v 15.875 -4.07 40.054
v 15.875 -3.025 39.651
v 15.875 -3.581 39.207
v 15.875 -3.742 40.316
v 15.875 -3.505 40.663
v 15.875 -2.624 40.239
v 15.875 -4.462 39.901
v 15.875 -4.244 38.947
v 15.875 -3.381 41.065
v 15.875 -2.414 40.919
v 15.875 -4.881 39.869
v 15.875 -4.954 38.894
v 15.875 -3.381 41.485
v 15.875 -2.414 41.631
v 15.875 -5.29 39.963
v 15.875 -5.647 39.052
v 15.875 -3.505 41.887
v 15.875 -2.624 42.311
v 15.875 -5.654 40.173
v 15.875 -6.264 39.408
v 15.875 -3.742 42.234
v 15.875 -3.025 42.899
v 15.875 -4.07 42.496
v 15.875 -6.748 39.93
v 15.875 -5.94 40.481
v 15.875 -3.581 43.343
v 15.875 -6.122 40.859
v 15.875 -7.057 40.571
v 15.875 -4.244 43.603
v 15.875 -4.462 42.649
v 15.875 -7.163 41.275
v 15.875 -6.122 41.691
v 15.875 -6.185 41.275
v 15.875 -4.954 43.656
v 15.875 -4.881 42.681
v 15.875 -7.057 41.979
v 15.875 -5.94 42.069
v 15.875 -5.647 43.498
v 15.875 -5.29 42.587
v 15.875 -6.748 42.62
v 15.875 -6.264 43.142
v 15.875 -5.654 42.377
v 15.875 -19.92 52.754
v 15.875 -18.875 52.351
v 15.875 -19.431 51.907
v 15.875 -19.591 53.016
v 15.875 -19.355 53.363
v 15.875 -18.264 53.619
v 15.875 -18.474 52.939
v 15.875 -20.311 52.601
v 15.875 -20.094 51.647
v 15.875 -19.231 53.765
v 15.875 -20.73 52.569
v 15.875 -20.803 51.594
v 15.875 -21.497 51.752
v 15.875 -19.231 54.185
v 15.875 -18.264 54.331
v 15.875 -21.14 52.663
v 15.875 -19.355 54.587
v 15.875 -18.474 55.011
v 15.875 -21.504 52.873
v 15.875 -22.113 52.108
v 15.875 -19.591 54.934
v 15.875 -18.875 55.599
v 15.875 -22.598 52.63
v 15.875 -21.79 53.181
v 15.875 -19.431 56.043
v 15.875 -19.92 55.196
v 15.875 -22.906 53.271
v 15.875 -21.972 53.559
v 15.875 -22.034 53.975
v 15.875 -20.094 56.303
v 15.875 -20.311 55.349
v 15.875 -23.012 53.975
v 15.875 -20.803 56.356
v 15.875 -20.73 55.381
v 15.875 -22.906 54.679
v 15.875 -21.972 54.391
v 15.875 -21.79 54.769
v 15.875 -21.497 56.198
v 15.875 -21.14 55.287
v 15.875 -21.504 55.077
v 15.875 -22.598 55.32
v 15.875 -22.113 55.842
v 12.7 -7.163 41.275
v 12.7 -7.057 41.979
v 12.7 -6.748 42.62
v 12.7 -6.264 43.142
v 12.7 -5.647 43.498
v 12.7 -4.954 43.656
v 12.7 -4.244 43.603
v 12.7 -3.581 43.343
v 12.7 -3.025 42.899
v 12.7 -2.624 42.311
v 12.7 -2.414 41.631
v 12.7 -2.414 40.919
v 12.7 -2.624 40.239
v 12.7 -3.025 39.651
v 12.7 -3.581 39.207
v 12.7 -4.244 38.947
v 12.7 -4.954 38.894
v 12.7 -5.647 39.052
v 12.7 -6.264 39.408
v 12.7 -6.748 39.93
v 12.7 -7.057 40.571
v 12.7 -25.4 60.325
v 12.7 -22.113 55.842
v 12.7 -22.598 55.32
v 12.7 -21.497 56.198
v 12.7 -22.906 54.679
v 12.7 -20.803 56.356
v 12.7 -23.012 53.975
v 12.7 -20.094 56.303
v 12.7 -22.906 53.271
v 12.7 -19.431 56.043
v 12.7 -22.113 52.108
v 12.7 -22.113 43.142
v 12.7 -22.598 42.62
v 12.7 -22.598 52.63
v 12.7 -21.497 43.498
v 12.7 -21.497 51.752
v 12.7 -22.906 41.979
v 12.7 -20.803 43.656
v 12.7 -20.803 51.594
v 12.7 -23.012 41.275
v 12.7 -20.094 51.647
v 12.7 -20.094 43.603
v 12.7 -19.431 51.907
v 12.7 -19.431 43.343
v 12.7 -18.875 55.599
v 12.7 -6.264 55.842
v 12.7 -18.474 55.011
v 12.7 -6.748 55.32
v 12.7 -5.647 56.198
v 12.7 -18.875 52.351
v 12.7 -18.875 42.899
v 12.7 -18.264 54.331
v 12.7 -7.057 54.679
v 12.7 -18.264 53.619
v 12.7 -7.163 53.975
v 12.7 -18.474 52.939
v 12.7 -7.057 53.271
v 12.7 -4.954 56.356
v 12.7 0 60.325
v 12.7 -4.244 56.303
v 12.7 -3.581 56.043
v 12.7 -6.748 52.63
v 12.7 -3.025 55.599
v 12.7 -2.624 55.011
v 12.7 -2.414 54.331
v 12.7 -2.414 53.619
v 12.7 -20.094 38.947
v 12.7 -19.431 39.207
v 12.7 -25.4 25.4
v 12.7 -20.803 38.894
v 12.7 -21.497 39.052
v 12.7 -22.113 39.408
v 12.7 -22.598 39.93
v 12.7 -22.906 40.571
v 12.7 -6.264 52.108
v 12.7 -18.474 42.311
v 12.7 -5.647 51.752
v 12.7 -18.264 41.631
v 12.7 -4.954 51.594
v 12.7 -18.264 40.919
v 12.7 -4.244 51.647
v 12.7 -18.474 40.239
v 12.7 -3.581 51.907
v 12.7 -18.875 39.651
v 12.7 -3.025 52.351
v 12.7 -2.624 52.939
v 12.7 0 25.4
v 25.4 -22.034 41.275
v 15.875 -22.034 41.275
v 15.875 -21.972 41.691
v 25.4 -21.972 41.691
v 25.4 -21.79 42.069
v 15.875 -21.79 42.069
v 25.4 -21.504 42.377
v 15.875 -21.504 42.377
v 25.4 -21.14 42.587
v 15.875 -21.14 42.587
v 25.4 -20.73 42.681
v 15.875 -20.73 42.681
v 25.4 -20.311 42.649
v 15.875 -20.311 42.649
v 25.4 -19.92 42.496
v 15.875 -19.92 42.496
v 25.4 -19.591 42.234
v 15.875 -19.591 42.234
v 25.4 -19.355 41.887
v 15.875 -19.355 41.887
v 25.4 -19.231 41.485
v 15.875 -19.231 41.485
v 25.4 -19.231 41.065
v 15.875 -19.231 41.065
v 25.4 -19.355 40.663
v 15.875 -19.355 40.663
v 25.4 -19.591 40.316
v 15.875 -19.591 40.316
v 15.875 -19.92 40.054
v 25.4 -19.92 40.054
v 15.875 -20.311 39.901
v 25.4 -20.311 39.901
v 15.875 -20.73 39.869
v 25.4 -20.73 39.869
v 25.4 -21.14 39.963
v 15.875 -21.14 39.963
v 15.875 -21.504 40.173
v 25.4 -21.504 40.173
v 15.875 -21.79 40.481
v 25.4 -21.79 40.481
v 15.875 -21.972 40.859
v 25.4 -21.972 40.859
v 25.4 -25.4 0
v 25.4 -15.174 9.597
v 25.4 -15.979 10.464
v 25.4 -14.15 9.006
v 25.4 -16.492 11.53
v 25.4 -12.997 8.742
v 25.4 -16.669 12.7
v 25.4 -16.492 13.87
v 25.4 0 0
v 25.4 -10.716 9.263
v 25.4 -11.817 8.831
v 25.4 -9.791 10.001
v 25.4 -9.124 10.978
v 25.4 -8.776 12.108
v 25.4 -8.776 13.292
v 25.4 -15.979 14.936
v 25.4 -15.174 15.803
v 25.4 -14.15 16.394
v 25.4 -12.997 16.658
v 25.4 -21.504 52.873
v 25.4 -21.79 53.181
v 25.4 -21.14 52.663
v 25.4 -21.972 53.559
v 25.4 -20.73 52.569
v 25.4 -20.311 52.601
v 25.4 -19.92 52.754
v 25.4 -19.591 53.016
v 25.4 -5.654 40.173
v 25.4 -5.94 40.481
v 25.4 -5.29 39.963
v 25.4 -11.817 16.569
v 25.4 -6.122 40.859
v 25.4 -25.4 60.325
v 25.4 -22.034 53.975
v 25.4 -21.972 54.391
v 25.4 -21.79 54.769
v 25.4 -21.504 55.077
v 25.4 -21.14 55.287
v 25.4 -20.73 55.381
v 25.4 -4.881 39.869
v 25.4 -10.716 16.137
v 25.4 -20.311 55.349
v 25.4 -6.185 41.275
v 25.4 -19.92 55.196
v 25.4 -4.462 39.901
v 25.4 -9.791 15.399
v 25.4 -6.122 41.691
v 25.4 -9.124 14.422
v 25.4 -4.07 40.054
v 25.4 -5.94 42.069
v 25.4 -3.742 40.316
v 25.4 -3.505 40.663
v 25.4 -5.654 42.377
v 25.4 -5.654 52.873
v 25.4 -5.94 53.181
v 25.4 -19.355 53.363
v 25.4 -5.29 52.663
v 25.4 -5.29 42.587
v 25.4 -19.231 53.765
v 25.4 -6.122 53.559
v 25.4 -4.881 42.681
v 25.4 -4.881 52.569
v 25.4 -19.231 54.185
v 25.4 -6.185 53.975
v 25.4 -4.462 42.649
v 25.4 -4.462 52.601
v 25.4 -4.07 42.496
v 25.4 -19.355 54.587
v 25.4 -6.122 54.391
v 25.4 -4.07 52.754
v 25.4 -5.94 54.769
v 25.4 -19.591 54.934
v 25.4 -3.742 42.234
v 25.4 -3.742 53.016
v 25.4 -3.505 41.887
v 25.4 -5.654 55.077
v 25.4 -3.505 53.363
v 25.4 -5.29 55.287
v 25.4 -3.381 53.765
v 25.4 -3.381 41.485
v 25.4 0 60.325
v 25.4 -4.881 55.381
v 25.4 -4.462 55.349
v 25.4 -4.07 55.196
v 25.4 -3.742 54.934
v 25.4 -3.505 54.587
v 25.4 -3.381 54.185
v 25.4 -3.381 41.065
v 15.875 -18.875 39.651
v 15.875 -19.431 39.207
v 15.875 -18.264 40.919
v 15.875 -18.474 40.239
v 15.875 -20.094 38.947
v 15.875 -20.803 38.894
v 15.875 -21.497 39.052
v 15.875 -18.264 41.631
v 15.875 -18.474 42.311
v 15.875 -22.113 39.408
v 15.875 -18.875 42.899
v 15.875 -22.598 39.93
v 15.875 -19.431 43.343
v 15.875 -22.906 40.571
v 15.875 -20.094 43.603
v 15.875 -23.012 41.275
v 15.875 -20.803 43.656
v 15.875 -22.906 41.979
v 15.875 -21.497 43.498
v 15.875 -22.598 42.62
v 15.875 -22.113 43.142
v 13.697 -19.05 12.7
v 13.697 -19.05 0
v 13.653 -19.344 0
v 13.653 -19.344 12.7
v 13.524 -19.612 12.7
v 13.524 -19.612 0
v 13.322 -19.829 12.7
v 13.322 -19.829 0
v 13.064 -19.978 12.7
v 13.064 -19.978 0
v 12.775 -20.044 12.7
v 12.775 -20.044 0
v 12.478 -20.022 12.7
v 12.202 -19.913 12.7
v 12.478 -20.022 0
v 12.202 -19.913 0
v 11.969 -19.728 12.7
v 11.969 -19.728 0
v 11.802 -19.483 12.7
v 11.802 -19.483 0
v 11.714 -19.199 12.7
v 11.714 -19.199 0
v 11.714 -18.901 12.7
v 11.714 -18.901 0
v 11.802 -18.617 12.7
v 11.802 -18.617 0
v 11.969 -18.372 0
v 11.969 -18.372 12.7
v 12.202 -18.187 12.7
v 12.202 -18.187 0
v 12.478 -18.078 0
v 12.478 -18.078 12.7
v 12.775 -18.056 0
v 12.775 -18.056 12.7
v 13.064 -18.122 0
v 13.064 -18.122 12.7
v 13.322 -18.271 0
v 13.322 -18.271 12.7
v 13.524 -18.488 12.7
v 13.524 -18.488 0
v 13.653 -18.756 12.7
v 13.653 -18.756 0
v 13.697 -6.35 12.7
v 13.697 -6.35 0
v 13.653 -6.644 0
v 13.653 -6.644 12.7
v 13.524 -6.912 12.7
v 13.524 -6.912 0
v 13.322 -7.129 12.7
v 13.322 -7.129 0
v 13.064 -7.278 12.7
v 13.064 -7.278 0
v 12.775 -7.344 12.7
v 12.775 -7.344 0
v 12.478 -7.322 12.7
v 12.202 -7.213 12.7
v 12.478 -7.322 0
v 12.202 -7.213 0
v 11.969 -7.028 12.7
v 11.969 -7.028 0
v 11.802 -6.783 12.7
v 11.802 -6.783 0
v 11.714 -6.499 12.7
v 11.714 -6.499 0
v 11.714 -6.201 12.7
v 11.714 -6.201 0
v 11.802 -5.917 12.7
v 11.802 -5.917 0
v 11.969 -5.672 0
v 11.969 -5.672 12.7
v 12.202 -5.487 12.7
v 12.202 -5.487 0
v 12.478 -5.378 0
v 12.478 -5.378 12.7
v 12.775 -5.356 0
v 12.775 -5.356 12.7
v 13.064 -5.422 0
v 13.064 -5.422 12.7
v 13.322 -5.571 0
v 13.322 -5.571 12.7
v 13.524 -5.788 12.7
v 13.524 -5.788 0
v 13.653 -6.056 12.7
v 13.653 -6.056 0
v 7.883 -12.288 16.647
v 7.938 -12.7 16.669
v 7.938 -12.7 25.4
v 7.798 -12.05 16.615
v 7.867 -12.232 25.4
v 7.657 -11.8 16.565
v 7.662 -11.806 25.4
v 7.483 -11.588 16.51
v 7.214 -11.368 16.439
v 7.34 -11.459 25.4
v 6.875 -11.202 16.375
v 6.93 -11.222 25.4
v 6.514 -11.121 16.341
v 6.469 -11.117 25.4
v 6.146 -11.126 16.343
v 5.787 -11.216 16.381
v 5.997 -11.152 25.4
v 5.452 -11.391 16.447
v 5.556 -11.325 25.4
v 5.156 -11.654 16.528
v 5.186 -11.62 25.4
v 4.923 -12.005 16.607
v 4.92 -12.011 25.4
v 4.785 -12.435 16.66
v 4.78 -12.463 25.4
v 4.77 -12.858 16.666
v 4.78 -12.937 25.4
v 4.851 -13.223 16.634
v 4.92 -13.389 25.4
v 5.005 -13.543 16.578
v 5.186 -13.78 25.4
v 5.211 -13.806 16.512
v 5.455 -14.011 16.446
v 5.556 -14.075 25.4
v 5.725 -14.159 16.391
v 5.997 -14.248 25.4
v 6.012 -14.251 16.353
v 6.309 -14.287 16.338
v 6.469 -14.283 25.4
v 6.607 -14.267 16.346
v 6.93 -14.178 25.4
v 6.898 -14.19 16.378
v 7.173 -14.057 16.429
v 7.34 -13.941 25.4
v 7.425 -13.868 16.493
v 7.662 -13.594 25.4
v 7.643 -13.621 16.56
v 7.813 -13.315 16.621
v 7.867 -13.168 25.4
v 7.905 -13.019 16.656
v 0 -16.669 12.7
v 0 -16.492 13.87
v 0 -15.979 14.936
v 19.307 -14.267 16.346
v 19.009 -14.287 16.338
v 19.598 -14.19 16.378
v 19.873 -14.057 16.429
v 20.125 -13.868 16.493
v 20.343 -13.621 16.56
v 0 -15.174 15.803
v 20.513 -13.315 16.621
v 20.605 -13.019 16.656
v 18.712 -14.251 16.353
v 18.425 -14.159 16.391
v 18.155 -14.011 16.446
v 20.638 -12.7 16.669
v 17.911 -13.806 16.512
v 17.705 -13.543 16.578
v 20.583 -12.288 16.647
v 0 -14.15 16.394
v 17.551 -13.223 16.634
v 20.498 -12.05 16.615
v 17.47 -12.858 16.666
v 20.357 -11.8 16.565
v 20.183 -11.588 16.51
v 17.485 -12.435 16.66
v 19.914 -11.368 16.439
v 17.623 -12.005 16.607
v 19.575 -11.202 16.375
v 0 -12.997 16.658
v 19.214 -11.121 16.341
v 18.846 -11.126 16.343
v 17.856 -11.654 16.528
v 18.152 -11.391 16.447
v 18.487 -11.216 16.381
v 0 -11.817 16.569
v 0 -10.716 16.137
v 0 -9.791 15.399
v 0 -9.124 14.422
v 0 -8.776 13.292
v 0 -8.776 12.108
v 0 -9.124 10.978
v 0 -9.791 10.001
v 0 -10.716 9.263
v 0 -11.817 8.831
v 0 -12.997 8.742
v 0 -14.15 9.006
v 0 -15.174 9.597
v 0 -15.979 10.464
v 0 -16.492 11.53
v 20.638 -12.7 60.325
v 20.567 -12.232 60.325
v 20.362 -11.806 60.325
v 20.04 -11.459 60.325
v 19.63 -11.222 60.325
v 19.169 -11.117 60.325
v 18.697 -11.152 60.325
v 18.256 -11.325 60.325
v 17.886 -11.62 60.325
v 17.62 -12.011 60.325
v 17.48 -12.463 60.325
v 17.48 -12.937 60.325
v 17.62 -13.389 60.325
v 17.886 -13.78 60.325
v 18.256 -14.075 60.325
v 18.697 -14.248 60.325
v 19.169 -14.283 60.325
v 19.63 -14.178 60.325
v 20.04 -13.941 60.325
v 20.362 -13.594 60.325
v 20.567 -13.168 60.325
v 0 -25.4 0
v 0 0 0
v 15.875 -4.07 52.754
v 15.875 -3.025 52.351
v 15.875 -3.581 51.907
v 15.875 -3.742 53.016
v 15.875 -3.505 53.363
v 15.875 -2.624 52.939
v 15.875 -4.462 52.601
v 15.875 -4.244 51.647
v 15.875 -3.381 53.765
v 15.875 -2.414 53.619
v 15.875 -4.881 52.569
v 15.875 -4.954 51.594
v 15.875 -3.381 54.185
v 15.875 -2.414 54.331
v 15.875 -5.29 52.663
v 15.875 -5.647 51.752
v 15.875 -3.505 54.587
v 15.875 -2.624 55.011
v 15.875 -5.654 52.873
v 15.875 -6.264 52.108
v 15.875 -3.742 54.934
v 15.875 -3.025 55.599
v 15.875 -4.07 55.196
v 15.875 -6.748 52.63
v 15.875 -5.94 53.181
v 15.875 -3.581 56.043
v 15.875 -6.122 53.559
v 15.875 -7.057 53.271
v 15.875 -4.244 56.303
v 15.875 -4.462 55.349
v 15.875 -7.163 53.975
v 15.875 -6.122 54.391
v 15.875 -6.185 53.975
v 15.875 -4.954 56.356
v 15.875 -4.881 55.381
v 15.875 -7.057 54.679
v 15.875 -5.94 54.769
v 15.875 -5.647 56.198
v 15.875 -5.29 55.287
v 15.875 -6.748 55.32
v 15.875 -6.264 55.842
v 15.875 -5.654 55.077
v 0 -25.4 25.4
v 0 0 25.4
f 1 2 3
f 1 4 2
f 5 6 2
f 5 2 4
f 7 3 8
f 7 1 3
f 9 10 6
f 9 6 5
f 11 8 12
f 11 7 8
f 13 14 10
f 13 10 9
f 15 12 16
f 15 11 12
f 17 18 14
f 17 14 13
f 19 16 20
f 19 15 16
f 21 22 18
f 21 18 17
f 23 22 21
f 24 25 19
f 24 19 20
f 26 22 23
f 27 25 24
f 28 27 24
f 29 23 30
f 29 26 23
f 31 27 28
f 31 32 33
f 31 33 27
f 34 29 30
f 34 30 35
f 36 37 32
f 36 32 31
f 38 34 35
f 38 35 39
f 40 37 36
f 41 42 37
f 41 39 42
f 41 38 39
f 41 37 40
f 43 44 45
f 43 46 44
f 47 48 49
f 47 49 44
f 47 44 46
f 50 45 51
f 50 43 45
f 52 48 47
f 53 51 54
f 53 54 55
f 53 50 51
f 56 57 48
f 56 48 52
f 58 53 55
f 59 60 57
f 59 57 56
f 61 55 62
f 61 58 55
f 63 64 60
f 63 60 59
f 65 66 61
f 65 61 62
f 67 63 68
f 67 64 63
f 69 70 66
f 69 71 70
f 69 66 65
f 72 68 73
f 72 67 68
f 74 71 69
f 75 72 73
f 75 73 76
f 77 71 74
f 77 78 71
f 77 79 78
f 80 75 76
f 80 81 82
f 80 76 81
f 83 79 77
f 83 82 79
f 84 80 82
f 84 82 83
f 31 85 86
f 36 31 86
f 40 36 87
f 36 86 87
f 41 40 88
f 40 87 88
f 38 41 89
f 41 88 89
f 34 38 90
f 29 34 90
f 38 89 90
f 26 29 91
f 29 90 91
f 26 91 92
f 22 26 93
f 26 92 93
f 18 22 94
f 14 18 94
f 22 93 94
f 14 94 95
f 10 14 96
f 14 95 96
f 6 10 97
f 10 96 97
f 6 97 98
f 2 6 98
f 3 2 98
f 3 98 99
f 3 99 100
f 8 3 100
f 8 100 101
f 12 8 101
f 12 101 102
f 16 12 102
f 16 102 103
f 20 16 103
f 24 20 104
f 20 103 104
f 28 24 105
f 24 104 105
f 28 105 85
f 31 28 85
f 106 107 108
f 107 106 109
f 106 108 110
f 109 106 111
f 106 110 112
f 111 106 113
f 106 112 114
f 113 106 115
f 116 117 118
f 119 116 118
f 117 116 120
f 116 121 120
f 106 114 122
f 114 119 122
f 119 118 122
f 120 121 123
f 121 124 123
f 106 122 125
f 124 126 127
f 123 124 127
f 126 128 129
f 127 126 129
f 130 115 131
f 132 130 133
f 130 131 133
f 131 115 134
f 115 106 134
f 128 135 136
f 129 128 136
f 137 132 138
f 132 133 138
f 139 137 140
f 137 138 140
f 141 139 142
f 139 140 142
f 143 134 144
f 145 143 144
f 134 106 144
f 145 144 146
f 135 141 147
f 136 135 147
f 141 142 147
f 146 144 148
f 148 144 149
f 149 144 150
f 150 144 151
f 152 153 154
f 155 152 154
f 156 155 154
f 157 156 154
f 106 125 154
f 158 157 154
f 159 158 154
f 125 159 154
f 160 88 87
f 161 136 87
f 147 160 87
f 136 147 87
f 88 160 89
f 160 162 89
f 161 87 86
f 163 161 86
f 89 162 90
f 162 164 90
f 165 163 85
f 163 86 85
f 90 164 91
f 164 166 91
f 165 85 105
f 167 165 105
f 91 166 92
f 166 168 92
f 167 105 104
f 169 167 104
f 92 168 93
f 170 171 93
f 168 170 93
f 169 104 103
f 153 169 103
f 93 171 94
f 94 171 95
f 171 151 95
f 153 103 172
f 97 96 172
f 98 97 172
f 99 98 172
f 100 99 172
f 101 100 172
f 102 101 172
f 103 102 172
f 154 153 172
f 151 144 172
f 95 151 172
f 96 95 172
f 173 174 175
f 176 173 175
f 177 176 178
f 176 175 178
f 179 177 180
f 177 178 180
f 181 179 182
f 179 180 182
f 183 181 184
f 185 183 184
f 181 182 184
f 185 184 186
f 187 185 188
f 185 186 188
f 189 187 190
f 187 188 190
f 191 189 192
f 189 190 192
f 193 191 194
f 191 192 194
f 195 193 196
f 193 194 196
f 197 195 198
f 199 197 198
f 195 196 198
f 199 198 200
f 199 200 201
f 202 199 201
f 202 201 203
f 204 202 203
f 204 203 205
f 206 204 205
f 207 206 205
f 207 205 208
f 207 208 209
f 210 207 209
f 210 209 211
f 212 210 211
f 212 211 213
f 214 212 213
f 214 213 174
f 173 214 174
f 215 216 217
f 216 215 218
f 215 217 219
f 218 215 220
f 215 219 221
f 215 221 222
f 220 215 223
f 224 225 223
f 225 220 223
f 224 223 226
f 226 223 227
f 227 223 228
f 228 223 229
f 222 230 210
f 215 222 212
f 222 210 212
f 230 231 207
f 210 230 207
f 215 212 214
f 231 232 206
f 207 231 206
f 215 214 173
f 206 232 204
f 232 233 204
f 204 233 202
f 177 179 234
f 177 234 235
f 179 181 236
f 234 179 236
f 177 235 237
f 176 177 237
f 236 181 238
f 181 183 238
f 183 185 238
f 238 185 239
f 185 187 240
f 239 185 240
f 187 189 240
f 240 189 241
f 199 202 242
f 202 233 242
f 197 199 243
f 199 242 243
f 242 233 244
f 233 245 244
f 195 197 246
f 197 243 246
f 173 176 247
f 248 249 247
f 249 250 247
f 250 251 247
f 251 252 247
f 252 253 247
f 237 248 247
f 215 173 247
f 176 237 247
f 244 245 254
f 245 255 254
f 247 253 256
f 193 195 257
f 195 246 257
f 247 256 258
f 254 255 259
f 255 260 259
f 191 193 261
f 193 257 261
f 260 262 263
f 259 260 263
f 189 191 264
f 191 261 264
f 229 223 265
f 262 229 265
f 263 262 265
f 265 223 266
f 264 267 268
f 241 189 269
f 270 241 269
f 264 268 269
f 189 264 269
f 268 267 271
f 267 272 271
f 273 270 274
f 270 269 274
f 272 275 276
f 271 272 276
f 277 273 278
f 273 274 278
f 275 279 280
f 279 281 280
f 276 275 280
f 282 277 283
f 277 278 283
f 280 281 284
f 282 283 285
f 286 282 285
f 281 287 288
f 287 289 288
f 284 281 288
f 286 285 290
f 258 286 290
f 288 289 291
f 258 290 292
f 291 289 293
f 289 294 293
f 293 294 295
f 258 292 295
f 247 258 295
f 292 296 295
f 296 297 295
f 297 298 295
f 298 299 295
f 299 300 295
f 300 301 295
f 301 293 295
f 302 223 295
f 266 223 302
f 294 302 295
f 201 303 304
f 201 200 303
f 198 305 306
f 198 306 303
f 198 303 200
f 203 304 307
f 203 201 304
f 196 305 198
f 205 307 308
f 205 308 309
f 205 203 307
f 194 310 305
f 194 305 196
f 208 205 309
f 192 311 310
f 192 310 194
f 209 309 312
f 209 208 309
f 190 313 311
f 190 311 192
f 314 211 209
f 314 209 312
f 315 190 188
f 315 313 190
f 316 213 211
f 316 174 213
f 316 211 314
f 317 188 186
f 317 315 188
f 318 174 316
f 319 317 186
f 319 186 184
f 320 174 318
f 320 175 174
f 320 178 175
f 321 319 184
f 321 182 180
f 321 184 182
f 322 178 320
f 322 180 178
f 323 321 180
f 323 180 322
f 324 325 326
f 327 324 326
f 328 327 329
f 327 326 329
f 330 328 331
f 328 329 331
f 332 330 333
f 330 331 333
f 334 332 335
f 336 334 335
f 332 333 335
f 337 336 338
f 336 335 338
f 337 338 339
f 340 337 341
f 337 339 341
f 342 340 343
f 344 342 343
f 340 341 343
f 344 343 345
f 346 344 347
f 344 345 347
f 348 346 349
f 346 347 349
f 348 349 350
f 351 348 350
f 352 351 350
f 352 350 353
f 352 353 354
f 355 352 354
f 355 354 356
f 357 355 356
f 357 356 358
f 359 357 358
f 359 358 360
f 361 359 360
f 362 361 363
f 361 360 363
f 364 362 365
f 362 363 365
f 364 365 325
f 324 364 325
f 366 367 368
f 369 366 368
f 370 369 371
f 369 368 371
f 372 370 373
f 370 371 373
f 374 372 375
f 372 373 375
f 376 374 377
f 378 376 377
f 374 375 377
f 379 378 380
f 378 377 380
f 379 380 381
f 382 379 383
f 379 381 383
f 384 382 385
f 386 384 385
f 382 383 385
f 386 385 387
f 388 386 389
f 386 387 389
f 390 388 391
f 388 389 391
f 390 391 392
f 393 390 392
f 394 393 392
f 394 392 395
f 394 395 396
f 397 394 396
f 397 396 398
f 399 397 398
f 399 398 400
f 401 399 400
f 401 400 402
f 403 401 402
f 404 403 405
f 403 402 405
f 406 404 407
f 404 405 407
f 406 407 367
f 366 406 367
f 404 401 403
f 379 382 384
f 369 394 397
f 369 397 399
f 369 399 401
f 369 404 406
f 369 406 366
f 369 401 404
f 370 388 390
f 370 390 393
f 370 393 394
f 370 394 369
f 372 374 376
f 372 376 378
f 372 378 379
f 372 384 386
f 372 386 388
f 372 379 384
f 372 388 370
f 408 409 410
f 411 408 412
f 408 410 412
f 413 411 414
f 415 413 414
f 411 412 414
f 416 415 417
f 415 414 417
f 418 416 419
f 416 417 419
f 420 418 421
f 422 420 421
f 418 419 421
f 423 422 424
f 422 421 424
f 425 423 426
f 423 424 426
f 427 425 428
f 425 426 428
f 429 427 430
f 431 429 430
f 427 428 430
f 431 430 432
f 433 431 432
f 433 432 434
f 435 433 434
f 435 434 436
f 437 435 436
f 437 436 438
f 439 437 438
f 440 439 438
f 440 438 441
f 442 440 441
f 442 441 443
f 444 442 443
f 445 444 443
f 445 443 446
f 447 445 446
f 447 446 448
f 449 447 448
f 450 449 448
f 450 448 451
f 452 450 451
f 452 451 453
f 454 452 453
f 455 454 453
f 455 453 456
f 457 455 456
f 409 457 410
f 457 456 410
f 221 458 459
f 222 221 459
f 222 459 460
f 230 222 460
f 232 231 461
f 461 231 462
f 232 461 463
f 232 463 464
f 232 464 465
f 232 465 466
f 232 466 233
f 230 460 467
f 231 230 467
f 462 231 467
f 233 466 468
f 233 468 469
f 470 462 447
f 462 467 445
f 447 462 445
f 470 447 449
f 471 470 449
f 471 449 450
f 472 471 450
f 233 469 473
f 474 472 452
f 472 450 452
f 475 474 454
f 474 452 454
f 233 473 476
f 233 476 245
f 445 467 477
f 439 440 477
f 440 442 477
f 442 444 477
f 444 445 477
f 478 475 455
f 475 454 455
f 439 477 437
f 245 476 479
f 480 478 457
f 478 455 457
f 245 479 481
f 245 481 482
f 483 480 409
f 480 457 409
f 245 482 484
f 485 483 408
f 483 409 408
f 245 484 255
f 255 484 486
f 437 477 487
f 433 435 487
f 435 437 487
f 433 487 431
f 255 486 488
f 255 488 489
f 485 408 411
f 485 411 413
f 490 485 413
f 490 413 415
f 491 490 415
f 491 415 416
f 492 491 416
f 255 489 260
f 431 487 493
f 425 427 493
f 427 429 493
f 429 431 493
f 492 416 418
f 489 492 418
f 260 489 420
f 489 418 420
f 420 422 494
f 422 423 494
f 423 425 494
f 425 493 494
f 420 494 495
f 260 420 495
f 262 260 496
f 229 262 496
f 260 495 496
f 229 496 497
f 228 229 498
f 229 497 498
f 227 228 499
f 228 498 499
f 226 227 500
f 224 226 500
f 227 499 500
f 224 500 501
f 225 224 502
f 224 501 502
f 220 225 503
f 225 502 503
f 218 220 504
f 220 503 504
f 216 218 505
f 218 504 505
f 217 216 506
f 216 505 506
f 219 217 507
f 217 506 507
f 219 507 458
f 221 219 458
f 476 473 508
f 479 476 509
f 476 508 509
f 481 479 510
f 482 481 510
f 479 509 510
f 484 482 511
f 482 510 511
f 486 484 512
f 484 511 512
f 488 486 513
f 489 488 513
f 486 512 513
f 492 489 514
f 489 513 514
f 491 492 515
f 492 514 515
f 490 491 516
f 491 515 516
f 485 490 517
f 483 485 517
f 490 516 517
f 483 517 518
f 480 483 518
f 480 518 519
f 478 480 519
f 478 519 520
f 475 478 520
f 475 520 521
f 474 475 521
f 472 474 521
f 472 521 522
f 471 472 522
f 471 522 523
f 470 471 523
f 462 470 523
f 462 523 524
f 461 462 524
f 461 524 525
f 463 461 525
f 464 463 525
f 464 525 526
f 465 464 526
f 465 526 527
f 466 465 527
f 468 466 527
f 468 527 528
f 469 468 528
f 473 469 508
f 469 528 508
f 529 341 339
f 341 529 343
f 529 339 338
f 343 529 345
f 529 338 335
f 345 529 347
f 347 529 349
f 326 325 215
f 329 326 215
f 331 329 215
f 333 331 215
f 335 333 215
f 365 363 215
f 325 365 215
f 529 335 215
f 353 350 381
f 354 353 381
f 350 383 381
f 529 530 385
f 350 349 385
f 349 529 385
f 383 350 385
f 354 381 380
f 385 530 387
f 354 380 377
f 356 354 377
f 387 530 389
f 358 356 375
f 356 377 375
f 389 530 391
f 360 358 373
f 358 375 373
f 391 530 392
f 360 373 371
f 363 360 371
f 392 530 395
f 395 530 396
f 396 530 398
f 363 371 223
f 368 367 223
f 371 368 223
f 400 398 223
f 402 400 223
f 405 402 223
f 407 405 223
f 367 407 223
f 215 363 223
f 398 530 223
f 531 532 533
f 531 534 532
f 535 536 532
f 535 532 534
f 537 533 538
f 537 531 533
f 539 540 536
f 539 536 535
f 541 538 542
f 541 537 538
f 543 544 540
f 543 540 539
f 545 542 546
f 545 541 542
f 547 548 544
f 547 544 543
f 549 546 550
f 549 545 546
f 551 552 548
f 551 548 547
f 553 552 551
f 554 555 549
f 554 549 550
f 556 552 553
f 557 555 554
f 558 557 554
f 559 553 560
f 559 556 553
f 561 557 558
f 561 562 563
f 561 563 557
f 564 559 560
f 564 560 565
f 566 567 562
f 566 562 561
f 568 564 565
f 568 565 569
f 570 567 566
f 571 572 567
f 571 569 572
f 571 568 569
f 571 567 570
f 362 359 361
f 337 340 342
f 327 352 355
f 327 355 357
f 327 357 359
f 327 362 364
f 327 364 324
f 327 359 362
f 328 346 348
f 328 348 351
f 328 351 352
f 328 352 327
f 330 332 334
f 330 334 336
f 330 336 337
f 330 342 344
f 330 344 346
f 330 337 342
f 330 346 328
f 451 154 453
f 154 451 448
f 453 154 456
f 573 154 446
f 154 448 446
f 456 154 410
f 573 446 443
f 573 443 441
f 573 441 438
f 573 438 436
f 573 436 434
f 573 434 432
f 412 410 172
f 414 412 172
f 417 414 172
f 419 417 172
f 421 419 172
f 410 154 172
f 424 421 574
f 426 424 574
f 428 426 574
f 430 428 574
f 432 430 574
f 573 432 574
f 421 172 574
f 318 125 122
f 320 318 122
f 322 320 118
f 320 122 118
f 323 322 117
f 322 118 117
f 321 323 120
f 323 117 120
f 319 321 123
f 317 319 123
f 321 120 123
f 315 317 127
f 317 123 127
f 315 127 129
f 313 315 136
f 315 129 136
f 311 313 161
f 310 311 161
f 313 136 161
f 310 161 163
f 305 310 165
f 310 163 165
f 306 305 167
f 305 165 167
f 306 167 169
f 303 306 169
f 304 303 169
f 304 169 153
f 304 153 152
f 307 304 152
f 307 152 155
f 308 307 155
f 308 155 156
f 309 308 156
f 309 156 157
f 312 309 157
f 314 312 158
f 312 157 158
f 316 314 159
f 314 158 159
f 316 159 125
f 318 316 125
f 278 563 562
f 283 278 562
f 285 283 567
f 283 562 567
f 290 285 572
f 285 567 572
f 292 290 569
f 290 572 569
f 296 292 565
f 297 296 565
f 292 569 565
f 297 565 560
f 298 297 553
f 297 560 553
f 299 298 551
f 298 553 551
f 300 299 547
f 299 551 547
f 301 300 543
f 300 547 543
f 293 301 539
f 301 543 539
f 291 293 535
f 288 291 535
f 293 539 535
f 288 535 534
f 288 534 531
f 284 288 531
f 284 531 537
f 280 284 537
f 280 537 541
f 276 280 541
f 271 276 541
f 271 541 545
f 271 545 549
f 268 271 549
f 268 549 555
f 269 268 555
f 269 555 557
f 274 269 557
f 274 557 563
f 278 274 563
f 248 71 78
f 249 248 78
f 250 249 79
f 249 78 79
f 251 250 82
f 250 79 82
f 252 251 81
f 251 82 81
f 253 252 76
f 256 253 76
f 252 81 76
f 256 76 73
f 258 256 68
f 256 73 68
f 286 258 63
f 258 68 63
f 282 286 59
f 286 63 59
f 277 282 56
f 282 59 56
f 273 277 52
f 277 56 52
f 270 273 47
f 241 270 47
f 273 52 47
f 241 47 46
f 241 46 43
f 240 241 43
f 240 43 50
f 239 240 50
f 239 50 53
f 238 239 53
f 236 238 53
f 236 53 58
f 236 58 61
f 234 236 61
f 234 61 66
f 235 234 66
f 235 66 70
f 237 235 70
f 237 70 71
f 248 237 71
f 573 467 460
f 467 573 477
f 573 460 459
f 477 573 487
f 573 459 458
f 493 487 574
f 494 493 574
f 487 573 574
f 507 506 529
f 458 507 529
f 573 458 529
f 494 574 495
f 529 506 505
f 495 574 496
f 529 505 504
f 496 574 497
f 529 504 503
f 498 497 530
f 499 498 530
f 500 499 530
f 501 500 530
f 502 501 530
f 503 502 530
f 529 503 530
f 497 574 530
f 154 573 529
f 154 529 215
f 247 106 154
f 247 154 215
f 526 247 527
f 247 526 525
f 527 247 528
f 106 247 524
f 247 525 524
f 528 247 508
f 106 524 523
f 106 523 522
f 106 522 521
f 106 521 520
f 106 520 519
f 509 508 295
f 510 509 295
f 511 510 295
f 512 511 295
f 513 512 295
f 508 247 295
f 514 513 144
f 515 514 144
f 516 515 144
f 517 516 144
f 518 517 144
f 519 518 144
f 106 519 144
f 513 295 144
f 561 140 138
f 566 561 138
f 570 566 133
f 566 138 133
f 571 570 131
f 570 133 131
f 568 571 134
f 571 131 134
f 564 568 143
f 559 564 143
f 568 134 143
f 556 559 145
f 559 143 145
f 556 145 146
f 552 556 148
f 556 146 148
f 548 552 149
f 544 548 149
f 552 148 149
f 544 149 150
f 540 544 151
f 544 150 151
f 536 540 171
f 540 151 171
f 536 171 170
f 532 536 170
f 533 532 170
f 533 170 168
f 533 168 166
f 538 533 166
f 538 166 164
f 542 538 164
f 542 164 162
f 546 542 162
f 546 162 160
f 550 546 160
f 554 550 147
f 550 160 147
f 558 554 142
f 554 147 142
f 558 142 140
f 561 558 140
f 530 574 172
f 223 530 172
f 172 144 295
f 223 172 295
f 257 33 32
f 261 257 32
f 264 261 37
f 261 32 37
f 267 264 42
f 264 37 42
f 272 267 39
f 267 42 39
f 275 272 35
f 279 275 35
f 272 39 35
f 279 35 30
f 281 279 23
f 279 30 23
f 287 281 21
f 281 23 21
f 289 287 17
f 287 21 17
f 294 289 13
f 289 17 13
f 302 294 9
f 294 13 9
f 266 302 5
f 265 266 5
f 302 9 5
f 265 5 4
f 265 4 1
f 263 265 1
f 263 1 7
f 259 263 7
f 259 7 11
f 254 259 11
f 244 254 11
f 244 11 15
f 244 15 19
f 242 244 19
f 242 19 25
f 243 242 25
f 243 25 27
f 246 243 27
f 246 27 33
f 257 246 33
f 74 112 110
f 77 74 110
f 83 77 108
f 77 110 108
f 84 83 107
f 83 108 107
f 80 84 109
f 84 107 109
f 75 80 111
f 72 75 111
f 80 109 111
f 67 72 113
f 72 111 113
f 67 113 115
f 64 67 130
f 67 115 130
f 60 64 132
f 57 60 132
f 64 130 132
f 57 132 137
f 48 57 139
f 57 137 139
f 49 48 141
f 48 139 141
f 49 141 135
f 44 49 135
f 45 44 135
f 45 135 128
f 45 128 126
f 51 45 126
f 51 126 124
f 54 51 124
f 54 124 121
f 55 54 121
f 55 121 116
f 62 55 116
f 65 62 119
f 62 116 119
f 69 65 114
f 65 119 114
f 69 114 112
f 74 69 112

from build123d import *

# Parameters (mm, degrees)
F1_DEPTH  = 25.4
F2_R      = 1.5875
F3_DEPTH  = 49.022
F4_R      = 3.96875
F5_DEPTH  = 25.4
F6_R      = 1.4097
F7_DEPTH  = 25.4
F9_R      = 2.3876
F10_DEPTH = 3.175
F11_R     = 0.99695
F12_DEPTH = 12.7
F13_R     = 1.5875
F14_DEPTH = 13.716


with BuildPart() as f1:
    # F0 (on Front) → F1 (new body)
    with BuildSketch(Plane.XZ):
        Polygon((0, 25.4), (0, 0), (25.4, 0), (25.4, 60.325), (12.7, 60.325), (12.7, 25.4), align=None)
    extrude(amount=F1_DEPTH)

    # F2 (on face) → F3 (cut)
    with BuildSketch(Plane.XY.offset(60.325)):
        with Locations((19.05, -12.7)):
            Circle(F2_R)
    extrude(amount=-F3_DEPTH, mode=Mode.SUBTRACT)

    # F4 (on face) → F5 (cut)
    with BuildSketch(Plane(origin=(0, 0, 0), x_dir=(0, -1, 0), z_dir=(-1, 0, 0))):
        with Locations((12.7, 12.7)):
            Circle(F4_R)
    extrude(amount=-F5_DEPTH, mode=Mode.SUBTRACT)

    # F6 (on face) → F7 (cut)
    with BuildSketch(Plane(origin=(12.7, 0, 0), x_dir=(0, -1, 0), z_dir=(-1, 0, 0))):
        with Locations((4.7752, 53.975)):
            Circle(F6_R)
        with Locations((4.7752, 41.275)):
            Circle(F6_R)
        with Locations((20.6248, 53.975)):
            Circle(F6_R)
        with Locations((20.6248, 41.275)):
            Circle(F6_R)
    extrude(amount=-F7_DEPTH, mode=Mode.SUBTRACT)

    # F9 (on face) → F10 (cut)
    with BuildSketch(Plane(origin=(12.7, 0, 0), x_dir=(0, -1, 0), z_dir=(-1, 0, 0))):
        with Locations((4.7752, 53.975)):
            Circle(F9_R)
        with Locations((4.7752, 41.275)):
            Circle(F9_R)
        with Locations((20.6248, 41.275)):
            Circle(F9_R)
        with Locations((20.6248, 53.975)):
            Circle(F9_R)
    extrude(amount=-F10_DEPTH, mode=Mode.SUBTRACT)

    # F11 (on face) → F12 (cut)
    with BuildSketch(Plane(origin=(0, 0, 0), x_dir=(1, 0, 0), z_dir=(0, 0, -1))):
        with Locations((12.7, 19.05)):
            Circle(F11_R)
        with Locations((12.7, 6.35)):
            Circle(F11_R)
    extrude(amount=-F12_DEPTH, mode=Mode.SUBTRACT)

    # F13 (on face) → F14 (cut)
    with BuildSketch(Plane.XY.offset(25.4)):
        with Locations((6.35, -12.7)):
            Circle(F13_R)
    extrude(amount=-F14_DEPTH, mode=Mode.SUBTRACT)


solid = f1.part
